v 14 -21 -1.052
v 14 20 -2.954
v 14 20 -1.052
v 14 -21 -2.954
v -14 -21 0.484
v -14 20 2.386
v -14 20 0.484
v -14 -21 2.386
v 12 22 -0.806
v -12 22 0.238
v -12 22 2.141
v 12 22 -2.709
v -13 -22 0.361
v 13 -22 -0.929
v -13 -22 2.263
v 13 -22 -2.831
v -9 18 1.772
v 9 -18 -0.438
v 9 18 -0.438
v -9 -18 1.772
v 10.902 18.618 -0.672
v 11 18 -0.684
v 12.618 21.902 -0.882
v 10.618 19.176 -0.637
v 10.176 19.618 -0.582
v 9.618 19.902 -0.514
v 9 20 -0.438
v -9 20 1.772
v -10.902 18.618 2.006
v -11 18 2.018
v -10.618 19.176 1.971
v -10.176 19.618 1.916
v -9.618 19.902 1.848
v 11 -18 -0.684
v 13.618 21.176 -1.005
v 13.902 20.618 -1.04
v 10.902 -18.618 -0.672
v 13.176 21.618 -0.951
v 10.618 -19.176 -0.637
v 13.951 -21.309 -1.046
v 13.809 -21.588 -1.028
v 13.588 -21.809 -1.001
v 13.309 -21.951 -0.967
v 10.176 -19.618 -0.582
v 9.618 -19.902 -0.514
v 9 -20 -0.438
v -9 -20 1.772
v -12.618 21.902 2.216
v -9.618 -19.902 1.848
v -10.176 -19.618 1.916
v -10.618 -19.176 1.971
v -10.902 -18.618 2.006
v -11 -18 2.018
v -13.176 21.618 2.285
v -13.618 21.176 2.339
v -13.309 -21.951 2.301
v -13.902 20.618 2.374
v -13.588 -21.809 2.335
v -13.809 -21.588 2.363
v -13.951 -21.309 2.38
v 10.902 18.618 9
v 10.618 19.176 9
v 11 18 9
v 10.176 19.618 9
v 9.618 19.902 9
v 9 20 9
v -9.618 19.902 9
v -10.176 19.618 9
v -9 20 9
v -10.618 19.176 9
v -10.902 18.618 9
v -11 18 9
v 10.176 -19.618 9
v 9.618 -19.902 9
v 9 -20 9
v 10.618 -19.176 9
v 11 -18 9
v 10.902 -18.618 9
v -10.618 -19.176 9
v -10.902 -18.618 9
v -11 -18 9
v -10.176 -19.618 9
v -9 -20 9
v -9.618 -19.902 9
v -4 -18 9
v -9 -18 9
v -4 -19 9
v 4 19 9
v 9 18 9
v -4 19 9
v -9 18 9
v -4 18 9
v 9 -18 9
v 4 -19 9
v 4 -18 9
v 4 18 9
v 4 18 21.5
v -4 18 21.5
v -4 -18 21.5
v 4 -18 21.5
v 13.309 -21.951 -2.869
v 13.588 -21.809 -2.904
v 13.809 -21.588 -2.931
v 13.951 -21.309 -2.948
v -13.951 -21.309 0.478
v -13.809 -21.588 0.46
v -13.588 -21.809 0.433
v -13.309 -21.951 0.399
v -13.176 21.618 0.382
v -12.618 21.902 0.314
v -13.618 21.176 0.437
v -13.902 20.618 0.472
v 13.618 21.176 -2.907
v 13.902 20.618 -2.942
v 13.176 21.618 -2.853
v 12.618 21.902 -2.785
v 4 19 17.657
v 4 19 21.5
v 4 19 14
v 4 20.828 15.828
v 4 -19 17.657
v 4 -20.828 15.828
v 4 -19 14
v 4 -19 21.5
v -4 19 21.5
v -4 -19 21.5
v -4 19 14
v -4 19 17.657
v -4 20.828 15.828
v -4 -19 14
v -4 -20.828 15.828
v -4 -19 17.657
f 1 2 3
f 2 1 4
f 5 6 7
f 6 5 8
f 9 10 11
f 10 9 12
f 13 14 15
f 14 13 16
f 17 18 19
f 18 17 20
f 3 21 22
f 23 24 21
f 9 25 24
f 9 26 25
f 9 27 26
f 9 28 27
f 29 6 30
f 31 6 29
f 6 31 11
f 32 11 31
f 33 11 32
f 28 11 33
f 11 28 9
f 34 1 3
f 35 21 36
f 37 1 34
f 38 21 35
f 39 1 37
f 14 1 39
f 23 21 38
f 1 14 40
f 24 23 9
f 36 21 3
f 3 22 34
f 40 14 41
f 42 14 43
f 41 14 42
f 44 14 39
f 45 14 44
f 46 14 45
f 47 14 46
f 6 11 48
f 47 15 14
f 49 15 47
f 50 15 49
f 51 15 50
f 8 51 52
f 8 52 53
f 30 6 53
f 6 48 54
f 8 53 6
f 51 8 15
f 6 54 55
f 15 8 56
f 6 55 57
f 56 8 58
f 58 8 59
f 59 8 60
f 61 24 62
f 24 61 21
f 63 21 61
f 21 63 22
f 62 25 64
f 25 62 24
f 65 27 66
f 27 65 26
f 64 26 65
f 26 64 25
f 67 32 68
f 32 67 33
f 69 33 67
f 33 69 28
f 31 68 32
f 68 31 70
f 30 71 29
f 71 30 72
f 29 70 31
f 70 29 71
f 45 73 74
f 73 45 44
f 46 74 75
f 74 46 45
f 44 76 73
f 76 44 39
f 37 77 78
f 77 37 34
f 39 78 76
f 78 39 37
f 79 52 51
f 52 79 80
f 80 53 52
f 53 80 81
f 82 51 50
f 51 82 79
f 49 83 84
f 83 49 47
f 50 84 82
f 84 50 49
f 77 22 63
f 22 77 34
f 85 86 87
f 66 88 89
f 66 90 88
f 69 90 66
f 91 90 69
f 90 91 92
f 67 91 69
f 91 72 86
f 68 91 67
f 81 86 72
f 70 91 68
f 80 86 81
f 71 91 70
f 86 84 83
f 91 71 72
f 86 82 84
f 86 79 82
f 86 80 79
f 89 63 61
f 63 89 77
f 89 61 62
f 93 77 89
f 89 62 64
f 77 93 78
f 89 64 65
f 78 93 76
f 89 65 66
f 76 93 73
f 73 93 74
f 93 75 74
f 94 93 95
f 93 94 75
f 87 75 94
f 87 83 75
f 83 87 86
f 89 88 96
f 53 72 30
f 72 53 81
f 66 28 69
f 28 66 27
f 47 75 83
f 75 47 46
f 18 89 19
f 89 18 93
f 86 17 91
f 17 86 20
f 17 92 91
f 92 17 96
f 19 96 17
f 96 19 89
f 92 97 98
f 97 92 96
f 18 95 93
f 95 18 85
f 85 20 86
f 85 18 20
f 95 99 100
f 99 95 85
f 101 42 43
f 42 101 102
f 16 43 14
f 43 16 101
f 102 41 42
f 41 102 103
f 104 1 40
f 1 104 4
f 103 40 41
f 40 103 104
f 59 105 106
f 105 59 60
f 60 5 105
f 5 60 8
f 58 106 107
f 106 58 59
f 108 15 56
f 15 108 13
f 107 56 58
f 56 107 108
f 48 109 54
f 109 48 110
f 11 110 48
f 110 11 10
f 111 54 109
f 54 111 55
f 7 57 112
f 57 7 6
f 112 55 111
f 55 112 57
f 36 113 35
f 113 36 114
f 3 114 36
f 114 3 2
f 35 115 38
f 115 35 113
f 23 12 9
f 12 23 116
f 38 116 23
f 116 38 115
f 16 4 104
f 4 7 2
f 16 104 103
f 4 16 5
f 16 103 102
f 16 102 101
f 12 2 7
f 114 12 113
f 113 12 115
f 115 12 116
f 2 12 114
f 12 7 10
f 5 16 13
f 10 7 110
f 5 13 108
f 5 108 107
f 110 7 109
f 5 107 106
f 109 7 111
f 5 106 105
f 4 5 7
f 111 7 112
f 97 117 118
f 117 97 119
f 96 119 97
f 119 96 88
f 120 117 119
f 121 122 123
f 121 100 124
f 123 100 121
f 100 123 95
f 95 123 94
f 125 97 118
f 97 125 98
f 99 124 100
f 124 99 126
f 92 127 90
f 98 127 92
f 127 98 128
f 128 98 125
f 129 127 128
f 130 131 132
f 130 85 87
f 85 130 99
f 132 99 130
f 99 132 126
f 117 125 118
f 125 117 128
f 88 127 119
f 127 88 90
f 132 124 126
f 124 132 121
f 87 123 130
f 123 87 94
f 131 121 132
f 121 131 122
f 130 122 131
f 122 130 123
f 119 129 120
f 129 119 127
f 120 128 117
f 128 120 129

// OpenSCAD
/*
translate([-10,-17.5,-1.5]) cube([20,35,3]);
translate([-1.5,-17.5,1.5]) cube([3,10,2]);
translate([-2.5,-17.5,3.5]) cube([5,10,1]);
translate([-5,5,1.5]) cube([1,5,2]);
*/

x = 28;
y = 44;
z = 3;
a = 7;

difference() {
	union() {
		difference()	{
			translate([-x/2,-y/2,-z]) cube([x,y,z*2]);
			translate([-(x+10)/2,-(y+10)/2,3]) rotate([0,a,0]) cube([x+10,y+10,z+10]);
		}
		difference() {
			translate([-11,-20,-1]) cube([22,40,10]);
			translate([-9,-18,-1]) cube([18,36,11]);
			translate([11,20,-1]) rotate([0,0,0]) rounding(11,2);
			translate([-11,20,-1]) rotate([0,0,90]) rounding(11,2);
			translate([11,-20,-1]) rotate([0,0,270]) rounding(11,2);
			translate([-11,-20,-1]) rotate([0,0,180]) rounding(11,2);
		}
	}

	translate([-(x+10)/2,-(y+10)/2,-12]) rotate([0,a,0]) cube([x+10,y+10,z+10]);
	translate([x/2,-y/2,-5]) rotate([0,0,270]) rounding(10,1);
	translate([-x/2,-y/2,-5]) rotate([0,0,180]) rounding(10,1);
	translate([-x/2,y/2,-5]) rotate([0,0,90]) rounding(10,2);
	translate([x/2,y/2,-5]) rotate([0,0,0]) rounding(10,2);
}
difference() {
	union() {
		translate([-(x-20)/2,-(y-6)/2,-z/2+1]) cube([x-20,y-6,22]);
		translate([-4,-18,13]) rotate([45,0,0]) cube([8,4,4]);
		translate([-4,18,13]) rotate([45,0,0]) cube([8,4,4]);
	}
	translate([-(x-18)/2,-(y-8)/2,-z/2+1]) cube([x-18,y-8,23]);
}


//#translate([-1,-22,1]) cube([2,2,15]);

module rounding(length, radius)
{
		
        translate([-radius,-radius,0]) difference()
        {
                cube([radius*2,radius*2,length]);
                translate([0,0,-1]) cylinder(length+2,radius,radius,$fn=20);
        }       
}
